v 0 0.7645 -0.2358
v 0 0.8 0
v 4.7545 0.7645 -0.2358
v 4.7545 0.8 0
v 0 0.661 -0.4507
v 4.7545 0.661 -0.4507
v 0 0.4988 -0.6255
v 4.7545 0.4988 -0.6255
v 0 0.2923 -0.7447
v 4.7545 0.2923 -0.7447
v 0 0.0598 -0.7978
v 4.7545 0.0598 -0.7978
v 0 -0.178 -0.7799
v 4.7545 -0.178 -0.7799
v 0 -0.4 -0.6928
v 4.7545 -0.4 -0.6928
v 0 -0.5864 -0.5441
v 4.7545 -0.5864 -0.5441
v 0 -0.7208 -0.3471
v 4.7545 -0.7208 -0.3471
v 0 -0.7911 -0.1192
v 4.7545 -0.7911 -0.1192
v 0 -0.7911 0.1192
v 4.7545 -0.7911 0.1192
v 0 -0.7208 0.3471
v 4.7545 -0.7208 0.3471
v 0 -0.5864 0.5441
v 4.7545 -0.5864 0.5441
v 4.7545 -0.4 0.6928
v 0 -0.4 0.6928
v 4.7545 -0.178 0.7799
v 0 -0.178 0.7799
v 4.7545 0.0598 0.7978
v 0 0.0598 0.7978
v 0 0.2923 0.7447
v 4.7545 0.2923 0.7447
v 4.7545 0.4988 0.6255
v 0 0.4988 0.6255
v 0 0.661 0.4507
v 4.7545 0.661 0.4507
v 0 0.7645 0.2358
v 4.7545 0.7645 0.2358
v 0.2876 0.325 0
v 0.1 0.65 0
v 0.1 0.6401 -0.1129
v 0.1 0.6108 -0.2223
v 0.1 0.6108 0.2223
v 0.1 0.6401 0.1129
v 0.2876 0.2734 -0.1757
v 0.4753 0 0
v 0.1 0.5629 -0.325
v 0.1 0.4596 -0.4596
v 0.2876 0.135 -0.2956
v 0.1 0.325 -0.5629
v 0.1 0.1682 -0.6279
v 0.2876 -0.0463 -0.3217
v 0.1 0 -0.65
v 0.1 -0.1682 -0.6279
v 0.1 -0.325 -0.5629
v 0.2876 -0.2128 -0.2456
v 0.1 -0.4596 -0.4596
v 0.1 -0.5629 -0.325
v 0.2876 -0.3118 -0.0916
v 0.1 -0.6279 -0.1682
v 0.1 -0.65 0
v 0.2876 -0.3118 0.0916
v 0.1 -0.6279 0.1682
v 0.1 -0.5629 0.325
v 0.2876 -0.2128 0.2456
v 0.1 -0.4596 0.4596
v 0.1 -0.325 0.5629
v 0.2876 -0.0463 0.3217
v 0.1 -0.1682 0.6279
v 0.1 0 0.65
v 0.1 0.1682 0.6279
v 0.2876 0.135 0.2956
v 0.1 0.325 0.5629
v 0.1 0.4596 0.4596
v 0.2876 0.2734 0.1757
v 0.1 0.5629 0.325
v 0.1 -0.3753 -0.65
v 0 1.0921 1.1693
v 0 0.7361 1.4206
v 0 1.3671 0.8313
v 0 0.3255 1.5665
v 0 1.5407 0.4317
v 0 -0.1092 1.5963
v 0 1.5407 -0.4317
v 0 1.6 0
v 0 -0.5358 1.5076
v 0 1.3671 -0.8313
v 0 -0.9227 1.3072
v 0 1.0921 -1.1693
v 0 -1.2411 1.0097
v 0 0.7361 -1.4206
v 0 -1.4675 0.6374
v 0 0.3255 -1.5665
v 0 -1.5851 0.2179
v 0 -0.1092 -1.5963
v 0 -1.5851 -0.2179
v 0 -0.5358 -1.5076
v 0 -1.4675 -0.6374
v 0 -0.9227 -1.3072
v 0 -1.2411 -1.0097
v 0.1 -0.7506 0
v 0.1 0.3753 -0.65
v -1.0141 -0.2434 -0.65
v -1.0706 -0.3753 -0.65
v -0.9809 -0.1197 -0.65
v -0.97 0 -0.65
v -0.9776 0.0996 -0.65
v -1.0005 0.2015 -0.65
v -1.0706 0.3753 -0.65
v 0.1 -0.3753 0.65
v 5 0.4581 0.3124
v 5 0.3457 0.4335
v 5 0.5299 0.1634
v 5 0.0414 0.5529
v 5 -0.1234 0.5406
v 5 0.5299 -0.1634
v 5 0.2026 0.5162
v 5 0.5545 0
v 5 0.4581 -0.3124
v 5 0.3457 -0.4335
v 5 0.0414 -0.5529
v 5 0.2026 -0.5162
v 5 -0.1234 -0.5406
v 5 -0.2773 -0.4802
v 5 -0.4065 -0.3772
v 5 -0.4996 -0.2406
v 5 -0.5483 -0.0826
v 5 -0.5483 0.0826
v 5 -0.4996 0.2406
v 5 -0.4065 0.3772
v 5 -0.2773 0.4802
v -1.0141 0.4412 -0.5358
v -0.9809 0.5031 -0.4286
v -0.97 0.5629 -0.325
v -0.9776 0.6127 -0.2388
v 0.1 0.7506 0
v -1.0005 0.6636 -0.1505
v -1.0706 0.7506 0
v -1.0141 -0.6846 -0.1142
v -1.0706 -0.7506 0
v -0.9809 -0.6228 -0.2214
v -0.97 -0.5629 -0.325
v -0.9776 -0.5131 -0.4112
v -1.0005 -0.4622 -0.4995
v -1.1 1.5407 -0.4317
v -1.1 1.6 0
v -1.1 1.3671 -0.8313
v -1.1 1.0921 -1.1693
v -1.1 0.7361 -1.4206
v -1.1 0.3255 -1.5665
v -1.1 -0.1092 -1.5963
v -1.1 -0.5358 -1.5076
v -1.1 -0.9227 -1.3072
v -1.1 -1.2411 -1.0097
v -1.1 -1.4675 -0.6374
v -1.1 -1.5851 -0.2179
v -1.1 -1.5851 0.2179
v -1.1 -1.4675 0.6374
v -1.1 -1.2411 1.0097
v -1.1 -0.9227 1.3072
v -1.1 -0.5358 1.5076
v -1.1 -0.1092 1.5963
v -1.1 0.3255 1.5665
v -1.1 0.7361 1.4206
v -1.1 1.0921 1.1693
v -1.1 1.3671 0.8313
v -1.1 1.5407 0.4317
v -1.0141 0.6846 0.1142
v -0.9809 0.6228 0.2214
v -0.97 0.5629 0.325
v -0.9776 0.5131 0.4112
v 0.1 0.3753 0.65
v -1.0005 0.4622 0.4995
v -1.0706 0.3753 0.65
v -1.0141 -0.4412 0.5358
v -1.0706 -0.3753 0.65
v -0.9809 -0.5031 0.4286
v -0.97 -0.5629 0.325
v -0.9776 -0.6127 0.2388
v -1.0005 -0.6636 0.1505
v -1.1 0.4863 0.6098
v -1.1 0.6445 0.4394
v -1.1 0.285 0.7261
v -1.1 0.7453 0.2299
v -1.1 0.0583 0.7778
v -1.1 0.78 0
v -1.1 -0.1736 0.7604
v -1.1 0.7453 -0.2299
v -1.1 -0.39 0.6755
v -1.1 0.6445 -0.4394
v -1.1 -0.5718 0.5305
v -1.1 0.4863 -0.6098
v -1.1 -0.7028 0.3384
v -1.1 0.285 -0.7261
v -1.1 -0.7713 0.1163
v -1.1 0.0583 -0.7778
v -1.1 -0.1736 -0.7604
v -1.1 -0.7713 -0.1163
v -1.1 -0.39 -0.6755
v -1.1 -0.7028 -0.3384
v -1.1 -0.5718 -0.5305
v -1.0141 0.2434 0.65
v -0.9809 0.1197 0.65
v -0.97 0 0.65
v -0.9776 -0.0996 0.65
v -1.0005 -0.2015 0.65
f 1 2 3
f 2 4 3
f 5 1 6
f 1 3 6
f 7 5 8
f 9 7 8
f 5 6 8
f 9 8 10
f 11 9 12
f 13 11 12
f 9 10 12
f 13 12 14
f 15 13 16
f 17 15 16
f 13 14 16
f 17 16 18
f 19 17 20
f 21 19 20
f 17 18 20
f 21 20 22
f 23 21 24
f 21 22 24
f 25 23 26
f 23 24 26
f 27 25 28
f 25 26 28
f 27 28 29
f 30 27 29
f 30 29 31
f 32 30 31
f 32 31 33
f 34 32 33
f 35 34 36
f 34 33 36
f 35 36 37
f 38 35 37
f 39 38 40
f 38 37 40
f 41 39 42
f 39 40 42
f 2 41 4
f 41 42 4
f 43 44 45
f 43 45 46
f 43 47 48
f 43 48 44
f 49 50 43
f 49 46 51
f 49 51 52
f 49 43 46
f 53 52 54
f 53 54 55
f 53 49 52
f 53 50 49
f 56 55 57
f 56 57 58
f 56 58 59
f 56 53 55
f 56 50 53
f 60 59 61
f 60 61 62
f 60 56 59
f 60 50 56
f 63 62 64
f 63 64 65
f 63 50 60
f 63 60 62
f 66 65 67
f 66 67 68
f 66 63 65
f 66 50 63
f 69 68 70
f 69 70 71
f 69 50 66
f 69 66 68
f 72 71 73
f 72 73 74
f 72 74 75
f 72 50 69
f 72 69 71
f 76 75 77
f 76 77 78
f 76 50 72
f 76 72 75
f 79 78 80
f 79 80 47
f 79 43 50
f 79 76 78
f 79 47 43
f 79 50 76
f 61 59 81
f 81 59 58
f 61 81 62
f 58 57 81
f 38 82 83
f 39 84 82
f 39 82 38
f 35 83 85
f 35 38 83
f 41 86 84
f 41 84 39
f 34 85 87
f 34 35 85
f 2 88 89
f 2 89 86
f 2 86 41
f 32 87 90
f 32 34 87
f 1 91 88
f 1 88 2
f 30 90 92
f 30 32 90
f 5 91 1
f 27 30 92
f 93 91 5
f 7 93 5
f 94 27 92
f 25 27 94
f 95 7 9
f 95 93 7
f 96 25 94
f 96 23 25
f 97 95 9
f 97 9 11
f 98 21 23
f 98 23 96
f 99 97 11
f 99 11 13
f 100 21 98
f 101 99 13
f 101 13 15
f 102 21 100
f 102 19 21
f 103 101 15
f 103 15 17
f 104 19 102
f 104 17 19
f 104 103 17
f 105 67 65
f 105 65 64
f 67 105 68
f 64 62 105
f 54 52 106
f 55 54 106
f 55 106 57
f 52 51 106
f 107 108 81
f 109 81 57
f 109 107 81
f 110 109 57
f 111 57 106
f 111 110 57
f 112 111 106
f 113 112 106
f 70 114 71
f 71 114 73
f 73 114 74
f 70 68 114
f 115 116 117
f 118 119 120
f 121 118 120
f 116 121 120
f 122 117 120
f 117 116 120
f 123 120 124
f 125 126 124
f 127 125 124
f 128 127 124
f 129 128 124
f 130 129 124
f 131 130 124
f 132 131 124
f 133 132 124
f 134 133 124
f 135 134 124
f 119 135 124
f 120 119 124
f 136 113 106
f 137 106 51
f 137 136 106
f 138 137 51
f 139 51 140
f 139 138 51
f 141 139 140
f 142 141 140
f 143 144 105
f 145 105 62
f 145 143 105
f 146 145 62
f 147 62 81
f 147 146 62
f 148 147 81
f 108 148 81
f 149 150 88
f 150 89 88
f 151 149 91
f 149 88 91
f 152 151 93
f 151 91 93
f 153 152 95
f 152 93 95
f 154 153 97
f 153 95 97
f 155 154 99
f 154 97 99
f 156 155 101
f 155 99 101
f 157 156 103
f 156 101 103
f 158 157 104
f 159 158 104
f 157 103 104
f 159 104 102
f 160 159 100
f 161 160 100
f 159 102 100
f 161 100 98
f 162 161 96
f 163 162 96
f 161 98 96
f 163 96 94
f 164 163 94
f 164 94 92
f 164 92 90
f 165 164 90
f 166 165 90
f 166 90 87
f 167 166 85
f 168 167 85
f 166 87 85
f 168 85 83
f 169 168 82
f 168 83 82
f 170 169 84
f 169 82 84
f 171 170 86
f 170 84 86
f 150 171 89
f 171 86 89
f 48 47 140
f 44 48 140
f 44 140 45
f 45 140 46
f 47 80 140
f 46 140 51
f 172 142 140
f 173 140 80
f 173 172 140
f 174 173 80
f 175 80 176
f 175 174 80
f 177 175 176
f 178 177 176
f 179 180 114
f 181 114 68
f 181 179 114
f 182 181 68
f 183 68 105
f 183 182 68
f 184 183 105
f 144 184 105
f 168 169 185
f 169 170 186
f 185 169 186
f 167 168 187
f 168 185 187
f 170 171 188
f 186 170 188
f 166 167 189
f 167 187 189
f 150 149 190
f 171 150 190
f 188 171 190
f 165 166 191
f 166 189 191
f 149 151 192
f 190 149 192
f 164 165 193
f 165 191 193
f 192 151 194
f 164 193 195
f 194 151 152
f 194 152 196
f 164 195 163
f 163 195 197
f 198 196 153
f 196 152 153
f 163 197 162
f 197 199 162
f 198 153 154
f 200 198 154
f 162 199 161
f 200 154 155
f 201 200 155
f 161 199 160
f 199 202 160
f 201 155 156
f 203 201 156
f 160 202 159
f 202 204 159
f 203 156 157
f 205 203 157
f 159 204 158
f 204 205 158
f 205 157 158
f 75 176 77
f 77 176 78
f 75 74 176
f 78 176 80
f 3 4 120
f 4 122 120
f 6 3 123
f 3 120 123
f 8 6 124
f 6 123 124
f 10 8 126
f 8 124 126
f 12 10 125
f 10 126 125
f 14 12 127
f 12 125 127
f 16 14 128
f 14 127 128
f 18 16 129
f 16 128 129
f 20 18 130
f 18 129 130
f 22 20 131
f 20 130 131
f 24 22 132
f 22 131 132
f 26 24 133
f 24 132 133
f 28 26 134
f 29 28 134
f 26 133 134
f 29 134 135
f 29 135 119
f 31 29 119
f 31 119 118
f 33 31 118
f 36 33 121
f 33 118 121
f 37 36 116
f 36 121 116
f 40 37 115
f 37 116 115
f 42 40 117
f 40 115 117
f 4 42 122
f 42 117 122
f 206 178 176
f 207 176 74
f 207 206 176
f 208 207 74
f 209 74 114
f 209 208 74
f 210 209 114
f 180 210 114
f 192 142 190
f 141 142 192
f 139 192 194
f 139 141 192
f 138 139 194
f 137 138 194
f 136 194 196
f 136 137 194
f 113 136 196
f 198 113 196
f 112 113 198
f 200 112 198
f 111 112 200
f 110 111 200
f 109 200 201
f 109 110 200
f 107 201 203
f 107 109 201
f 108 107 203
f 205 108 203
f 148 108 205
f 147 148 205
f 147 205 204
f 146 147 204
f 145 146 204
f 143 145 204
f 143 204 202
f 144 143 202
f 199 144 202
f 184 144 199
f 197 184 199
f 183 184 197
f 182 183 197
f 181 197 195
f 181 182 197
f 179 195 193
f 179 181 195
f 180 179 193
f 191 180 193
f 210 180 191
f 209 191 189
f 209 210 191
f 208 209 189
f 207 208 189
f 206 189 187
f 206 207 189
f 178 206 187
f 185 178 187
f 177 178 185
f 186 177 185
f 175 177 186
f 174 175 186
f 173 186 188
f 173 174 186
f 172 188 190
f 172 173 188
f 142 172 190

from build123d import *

# Parameters (mm, degrees)
SKETCH2_W          = 1.1
SKETCH2_H          = 1.6
CUT_EXTRUDE1_DEPTH = 1.2


with BuildPart() as part:
    # Sketch1 → Revolve1 (revolve)
    with BuildSketch(Plane.XY):
        Polygon((0, 0), (0, 0.8), (4.7545, 0.8), (5, 0.5545), (5, 0), align=None)
    revolve(axis=Axis((5, 0, 0), (-1, 0, 0)))

    # Sketch2 → Revolve2 (revolve)
    with BuildSketch(Plane.XY):
        with Locations((-0.55, 0.8)):
            Rectangle(SKETCH2_W, SKETCH2_H)
    revolve(axis=Axis((0, 0, 0), (-1, 0, 0)))

    # Sketch3 → Cut-Revolve1 (revolve, cut)
    with BuildSketch(Plane.XY):
        Polygon((-1.1, 0), (-1.1, 0.78), (-0.97, 0.65), (0.1, 0.65), (0.475277675, 0), align=None)
    revolve(axis=Axis((0.475277675, 0, 0), (-1, 0, 0)), mode=Mode.SUBTRACT)

    # Sketch4 → Cut-Extrude1 (cut)
    with BuildSketch(Plane(origin=(-1.1, 0, 0), x_dir=(0, 0, -1), z_dir=(1, 0, 0))):
        Polygon((-0.65, -0.375277675), (0, -0.75055535), (0.65, -0.375277675), (0.65, 0.375277675), (0, 0.75055535), (-0.65, 0.375277675), align=None)
    extrude(amount=CUT_EXTRUDE1_DEPTH, mode=Mode.SUBTRACT)


solid = part.part
